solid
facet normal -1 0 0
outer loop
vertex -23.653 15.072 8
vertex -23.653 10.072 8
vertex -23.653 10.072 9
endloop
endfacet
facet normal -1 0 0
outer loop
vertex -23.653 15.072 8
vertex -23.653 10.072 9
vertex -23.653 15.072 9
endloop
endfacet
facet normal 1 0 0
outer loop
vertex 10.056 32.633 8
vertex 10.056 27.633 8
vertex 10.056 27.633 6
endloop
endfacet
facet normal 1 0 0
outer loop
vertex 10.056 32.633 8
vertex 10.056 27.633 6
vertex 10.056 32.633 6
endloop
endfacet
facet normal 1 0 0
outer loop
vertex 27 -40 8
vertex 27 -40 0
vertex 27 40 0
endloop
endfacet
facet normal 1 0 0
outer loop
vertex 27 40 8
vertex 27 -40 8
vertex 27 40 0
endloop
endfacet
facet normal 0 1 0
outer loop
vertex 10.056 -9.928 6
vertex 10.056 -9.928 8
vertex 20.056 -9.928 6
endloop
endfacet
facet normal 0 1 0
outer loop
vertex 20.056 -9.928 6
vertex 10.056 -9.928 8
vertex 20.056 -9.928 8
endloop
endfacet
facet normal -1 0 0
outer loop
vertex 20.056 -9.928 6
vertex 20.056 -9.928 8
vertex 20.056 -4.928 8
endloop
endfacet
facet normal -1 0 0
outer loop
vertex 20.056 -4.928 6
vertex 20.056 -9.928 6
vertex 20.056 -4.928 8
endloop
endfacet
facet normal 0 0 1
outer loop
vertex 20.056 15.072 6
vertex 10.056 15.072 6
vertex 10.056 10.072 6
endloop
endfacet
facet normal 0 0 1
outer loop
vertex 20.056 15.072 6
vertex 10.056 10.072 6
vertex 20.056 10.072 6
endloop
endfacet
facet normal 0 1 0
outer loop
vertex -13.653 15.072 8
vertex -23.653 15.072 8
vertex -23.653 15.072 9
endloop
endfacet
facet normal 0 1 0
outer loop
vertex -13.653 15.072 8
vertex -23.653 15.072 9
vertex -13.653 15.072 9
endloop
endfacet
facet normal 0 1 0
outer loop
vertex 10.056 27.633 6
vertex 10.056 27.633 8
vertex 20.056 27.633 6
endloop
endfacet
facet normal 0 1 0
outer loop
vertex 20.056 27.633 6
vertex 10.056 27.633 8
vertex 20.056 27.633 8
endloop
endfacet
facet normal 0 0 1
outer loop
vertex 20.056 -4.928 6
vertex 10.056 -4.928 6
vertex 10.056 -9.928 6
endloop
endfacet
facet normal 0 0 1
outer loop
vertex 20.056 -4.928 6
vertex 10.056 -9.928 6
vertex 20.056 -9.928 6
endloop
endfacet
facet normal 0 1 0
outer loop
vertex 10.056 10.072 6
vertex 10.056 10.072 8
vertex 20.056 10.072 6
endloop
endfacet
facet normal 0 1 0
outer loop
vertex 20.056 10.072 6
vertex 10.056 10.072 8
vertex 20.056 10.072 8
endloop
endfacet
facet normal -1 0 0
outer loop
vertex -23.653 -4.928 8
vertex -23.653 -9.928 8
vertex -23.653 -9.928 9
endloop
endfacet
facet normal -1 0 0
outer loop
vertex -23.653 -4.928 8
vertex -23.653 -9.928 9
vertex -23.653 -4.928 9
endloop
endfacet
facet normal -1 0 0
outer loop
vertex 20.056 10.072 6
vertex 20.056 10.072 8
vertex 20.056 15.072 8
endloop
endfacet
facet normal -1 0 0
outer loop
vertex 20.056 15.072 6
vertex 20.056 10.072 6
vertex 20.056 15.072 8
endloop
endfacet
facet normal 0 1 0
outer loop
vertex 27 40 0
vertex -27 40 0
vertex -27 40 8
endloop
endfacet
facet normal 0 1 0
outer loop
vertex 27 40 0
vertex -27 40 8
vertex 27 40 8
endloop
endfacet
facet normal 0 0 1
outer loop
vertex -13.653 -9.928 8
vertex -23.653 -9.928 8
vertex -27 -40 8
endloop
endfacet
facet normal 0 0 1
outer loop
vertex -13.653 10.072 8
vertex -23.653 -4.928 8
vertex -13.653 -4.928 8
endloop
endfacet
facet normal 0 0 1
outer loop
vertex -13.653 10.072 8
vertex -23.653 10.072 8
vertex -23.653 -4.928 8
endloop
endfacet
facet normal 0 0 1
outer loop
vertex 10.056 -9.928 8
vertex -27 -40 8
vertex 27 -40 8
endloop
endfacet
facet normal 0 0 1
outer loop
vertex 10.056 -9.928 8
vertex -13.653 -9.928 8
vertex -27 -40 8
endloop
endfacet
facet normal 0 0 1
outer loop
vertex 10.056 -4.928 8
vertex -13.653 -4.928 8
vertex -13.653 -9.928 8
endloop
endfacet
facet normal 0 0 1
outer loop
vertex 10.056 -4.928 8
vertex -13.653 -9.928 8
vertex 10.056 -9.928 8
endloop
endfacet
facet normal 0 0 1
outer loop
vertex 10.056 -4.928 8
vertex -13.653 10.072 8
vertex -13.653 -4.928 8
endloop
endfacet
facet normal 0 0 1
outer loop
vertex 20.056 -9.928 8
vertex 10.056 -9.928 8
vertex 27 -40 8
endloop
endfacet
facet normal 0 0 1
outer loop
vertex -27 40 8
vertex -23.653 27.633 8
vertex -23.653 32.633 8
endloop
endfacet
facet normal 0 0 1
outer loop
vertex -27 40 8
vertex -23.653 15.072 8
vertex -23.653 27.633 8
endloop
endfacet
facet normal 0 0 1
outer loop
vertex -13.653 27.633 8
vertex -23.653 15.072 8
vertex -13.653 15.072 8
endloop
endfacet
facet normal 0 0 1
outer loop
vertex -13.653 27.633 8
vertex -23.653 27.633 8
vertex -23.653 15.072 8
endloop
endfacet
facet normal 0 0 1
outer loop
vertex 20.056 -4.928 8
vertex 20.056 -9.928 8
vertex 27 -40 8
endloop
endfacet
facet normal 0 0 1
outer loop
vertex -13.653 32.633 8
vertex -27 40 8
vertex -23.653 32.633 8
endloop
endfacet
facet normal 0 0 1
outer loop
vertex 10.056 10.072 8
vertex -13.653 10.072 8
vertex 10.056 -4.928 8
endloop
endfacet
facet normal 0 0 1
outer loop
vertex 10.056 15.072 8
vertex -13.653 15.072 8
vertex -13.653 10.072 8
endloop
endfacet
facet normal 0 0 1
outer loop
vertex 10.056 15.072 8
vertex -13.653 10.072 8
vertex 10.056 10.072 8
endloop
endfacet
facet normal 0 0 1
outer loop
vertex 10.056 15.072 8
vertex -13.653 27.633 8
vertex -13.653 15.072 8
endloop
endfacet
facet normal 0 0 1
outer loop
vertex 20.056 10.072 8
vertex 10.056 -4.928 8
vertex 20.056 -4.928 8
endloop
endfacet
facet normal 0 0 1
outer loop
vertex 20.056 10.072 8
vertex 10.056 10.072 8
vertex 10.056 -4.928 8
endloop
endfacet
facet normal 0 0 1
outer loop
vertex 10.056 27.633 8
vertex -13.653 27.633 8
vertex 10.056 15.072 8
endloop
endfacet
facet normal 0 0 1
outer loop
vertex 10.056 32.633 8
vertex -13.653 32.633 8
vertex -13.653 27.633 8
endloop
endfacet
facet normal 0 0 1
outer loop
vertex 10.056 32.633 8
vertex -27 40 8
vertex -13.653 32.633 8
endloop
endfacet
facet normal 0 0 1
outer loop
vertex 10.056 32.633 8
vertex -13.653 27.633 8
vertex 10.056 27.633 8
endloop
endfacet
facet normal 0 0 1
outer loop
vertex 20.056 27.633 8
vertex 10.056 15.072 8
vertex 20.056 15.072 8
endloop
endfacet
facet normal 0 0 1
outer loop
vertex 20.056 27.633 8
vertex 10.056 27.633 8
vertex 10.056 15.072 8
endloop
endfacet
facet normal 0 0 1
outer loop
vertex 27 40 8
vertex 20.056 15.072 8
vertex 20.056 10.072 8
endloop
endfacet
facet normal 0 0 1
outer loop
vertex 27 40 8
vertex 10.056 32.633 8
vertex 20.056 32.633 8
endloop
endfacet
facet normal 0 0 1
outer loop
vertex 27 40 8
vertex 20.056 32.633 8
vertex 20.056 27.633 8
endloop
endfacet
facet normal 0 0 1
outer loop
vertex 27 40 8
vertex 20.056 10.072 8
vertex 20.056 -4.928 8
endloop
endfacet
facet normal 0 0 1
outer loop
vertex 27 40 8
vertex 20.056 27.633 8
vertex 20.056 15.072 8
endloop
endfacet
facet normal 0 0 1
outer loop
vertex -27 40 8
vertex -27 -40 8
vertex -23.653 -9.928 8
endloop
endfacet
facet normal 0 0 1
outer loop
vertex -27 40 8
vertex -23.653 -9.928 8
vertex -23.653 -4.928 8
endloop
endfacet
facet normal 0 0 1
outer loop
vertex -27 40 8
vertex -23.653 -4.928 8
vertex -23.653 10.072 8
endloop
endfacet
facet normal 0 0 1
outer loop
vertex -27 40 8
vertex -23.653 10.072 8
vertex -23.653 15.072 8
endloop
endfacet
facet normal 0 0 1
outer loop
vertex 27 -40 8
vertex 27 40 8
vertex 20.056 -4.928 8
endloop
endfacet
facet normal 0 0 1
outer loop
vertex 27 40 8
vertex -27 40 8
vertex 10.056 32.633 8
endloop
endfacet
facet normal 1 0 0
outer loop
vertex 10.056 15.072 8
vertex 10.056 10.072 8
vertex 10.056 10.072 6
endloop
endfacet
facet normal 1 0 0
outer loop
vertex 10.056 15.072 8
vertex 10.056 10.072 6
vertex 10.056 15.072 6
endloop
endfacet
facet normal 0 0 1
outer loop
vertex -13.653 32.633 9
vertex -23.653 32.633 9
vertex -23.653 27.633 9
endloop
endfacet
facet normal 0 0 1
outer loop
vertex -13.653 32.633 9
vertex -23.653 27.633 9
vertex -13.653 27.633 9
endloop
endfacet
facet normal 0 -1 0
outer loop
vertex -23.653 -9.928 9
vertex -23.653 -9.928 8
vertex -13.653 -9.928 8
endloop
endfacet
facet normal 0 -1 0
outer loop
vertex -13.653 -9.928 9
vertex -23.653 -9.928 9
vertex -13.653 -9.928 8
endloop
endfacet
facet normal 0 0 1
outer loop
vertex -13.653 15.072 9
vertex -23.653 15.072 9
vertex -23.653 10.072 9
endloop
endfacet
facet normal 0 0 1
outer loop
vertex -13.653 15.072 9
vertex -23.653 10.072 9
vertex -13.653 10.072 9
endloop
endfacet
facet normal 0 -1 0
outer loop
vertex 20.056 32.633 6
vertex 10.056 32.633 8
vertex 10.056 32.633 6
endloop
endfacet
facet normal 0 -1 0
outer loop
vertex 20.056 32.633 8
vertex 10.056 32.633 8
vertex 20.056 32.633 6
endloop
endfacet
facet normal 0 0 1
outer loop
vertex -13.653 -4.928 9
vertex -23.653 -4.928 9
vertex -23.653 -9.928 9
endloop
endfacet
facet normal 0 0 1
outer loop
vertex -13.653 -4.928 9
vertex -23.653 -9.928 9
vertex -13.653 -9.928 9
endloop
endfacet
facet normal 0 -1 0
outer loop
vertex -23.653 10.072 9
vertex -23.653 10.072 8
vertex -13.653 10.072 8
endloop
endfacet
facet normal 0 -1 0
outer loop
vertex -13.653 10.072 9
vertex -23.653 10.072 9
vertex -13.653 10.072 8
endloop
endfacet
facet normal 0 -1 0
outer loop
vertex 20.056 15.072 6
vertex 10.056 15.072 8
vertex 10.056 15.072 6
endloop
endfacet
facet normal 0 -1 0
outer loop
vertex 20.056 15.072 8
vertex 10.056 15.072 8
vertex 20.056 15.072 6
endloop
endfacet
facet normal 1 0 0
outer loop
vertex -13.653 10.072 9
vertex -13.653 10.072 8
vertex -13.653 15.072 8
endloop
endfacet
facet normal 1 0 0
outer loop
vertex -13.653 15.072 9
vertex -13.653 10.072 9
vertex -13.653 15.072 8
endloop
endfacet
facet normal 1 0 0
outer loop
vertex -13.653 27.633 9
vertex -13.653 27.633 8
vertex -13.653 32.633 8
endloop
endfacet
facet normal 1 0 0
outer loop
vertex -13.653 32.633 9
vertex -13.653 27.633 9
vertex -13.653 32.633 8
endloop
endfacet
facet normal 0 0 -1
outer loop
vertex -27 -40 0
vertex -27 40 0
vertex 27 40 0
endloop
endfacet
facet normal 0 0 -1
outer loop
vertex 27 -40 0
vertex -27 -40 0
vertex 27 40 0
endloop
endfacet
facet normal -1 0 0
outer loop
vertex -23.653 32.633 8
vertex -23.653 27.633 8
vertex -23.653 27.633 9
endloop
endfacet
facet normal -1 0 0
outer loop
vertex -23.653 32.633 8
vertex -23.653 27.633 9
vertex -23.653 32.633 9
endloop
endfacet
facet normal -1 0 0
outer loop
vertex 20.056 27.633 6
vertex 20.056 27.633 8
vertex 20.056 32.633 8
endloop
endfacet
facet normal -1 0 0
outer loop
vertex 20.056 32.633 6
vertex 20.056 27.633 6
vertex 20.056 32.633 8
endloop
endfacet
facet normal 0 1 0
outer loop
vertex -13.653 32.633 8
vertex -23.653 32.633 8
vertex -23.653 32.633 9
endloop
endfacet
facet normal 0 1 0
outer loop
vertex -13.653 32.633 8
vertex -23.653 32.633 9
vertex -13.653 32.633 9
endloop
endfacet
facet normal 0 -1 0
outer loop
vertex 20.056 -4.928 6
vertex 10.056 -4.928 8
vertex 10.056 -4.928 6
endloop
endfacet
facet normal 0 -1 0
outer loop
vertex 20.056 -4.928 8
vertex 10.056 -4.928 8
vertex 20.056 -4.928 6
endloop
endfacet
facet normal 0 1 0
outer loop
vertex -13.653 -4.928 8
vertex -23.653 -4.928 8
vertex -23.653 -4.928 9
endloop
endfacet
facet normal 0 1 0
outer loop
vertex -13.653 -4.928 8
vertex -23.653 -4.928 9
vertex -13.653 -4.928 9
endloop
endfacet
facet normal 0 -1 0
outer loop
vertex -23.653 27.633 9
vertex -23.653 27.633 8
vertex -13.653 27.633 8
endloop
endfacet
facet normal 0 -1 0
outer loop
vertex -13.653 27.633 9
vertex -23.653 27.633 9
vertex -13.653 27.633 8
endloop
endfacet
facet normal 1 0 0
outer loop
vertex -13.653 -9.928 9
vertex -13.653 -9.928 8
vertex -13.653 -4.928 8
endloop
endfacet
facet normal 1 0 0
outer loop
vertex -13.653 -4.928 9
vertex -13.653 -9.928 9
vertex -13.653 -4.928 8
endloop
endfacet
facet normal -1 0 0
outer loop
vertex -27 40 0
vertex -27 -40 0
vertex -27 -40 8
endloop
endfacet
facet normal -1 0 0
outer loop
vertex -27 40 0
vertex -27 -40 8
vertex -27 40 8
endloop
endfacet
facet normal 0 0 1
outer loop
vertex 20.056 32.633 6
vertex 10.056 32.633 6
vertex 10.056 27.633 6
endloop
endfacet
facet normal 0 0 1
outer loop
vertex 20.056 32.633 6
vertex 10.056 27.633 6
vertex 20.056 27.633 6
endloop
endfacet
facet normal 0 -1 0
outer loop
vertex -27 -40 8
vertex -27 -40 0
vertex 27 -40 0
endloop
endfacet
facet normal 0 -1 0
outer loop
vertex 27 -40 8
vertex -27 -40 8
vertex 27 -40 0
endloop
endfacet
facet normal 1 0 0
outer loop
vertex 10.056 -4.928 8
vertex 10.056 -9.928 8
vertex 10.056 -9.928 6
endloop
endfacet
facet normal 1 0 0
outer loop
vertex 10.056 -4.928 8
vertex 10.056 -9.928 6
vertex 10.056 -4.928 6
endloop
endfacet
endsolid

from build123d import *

# Parameters (mm, degrees)
F0_W     = 54
F0_H     = 80
F1_DEPTH = 8
F2_W     = 10
F2_H     = 5
F3_DEPTH = 1
F4_W     = 10
F4_H     = 5
F5_DEPTH = 2


with BuildPart() as f1:
    # F0 (on Top) → F1 (new body)
    with BuildSketch(Plane.XY):
        Rectangle(F0_W, F0_H)
    extrude(amount=F1_DEPTH)

    # F2 (on face) → F3 (join)
    with BuildSketch(Plane.XY.offset(8)):
        with Locations((-18.653328, 30.132598)):
            Rectangle(F2_W, F2_H)
        with Locations((-18.653328, 12.571623)):
            Rectangle(F2_W, F2_H)
        with Locations((-18.653328, -7.428377)):
            Rectangle(F2_W, F2_H)
    extrude(amount=F3_DEPTH)

    # F4 (on face) → F5 (cut)
    with BuildSketch(Plane.XY.offset(8)):
        with Locations((15.056205, 30.132598)):
            Rectangle(F4_W, F4_H)
        with Locations((15.056205, 12.571623)):
            Rectangle(F4_W, F4_H)
        with Locations((15.056205, -7.428377)):
            Rectangle(F4_W, F4_H)
    extrude(amount=-F5_DEPTH, mode=Mode.SUBTRACT)


solid = f1.part
